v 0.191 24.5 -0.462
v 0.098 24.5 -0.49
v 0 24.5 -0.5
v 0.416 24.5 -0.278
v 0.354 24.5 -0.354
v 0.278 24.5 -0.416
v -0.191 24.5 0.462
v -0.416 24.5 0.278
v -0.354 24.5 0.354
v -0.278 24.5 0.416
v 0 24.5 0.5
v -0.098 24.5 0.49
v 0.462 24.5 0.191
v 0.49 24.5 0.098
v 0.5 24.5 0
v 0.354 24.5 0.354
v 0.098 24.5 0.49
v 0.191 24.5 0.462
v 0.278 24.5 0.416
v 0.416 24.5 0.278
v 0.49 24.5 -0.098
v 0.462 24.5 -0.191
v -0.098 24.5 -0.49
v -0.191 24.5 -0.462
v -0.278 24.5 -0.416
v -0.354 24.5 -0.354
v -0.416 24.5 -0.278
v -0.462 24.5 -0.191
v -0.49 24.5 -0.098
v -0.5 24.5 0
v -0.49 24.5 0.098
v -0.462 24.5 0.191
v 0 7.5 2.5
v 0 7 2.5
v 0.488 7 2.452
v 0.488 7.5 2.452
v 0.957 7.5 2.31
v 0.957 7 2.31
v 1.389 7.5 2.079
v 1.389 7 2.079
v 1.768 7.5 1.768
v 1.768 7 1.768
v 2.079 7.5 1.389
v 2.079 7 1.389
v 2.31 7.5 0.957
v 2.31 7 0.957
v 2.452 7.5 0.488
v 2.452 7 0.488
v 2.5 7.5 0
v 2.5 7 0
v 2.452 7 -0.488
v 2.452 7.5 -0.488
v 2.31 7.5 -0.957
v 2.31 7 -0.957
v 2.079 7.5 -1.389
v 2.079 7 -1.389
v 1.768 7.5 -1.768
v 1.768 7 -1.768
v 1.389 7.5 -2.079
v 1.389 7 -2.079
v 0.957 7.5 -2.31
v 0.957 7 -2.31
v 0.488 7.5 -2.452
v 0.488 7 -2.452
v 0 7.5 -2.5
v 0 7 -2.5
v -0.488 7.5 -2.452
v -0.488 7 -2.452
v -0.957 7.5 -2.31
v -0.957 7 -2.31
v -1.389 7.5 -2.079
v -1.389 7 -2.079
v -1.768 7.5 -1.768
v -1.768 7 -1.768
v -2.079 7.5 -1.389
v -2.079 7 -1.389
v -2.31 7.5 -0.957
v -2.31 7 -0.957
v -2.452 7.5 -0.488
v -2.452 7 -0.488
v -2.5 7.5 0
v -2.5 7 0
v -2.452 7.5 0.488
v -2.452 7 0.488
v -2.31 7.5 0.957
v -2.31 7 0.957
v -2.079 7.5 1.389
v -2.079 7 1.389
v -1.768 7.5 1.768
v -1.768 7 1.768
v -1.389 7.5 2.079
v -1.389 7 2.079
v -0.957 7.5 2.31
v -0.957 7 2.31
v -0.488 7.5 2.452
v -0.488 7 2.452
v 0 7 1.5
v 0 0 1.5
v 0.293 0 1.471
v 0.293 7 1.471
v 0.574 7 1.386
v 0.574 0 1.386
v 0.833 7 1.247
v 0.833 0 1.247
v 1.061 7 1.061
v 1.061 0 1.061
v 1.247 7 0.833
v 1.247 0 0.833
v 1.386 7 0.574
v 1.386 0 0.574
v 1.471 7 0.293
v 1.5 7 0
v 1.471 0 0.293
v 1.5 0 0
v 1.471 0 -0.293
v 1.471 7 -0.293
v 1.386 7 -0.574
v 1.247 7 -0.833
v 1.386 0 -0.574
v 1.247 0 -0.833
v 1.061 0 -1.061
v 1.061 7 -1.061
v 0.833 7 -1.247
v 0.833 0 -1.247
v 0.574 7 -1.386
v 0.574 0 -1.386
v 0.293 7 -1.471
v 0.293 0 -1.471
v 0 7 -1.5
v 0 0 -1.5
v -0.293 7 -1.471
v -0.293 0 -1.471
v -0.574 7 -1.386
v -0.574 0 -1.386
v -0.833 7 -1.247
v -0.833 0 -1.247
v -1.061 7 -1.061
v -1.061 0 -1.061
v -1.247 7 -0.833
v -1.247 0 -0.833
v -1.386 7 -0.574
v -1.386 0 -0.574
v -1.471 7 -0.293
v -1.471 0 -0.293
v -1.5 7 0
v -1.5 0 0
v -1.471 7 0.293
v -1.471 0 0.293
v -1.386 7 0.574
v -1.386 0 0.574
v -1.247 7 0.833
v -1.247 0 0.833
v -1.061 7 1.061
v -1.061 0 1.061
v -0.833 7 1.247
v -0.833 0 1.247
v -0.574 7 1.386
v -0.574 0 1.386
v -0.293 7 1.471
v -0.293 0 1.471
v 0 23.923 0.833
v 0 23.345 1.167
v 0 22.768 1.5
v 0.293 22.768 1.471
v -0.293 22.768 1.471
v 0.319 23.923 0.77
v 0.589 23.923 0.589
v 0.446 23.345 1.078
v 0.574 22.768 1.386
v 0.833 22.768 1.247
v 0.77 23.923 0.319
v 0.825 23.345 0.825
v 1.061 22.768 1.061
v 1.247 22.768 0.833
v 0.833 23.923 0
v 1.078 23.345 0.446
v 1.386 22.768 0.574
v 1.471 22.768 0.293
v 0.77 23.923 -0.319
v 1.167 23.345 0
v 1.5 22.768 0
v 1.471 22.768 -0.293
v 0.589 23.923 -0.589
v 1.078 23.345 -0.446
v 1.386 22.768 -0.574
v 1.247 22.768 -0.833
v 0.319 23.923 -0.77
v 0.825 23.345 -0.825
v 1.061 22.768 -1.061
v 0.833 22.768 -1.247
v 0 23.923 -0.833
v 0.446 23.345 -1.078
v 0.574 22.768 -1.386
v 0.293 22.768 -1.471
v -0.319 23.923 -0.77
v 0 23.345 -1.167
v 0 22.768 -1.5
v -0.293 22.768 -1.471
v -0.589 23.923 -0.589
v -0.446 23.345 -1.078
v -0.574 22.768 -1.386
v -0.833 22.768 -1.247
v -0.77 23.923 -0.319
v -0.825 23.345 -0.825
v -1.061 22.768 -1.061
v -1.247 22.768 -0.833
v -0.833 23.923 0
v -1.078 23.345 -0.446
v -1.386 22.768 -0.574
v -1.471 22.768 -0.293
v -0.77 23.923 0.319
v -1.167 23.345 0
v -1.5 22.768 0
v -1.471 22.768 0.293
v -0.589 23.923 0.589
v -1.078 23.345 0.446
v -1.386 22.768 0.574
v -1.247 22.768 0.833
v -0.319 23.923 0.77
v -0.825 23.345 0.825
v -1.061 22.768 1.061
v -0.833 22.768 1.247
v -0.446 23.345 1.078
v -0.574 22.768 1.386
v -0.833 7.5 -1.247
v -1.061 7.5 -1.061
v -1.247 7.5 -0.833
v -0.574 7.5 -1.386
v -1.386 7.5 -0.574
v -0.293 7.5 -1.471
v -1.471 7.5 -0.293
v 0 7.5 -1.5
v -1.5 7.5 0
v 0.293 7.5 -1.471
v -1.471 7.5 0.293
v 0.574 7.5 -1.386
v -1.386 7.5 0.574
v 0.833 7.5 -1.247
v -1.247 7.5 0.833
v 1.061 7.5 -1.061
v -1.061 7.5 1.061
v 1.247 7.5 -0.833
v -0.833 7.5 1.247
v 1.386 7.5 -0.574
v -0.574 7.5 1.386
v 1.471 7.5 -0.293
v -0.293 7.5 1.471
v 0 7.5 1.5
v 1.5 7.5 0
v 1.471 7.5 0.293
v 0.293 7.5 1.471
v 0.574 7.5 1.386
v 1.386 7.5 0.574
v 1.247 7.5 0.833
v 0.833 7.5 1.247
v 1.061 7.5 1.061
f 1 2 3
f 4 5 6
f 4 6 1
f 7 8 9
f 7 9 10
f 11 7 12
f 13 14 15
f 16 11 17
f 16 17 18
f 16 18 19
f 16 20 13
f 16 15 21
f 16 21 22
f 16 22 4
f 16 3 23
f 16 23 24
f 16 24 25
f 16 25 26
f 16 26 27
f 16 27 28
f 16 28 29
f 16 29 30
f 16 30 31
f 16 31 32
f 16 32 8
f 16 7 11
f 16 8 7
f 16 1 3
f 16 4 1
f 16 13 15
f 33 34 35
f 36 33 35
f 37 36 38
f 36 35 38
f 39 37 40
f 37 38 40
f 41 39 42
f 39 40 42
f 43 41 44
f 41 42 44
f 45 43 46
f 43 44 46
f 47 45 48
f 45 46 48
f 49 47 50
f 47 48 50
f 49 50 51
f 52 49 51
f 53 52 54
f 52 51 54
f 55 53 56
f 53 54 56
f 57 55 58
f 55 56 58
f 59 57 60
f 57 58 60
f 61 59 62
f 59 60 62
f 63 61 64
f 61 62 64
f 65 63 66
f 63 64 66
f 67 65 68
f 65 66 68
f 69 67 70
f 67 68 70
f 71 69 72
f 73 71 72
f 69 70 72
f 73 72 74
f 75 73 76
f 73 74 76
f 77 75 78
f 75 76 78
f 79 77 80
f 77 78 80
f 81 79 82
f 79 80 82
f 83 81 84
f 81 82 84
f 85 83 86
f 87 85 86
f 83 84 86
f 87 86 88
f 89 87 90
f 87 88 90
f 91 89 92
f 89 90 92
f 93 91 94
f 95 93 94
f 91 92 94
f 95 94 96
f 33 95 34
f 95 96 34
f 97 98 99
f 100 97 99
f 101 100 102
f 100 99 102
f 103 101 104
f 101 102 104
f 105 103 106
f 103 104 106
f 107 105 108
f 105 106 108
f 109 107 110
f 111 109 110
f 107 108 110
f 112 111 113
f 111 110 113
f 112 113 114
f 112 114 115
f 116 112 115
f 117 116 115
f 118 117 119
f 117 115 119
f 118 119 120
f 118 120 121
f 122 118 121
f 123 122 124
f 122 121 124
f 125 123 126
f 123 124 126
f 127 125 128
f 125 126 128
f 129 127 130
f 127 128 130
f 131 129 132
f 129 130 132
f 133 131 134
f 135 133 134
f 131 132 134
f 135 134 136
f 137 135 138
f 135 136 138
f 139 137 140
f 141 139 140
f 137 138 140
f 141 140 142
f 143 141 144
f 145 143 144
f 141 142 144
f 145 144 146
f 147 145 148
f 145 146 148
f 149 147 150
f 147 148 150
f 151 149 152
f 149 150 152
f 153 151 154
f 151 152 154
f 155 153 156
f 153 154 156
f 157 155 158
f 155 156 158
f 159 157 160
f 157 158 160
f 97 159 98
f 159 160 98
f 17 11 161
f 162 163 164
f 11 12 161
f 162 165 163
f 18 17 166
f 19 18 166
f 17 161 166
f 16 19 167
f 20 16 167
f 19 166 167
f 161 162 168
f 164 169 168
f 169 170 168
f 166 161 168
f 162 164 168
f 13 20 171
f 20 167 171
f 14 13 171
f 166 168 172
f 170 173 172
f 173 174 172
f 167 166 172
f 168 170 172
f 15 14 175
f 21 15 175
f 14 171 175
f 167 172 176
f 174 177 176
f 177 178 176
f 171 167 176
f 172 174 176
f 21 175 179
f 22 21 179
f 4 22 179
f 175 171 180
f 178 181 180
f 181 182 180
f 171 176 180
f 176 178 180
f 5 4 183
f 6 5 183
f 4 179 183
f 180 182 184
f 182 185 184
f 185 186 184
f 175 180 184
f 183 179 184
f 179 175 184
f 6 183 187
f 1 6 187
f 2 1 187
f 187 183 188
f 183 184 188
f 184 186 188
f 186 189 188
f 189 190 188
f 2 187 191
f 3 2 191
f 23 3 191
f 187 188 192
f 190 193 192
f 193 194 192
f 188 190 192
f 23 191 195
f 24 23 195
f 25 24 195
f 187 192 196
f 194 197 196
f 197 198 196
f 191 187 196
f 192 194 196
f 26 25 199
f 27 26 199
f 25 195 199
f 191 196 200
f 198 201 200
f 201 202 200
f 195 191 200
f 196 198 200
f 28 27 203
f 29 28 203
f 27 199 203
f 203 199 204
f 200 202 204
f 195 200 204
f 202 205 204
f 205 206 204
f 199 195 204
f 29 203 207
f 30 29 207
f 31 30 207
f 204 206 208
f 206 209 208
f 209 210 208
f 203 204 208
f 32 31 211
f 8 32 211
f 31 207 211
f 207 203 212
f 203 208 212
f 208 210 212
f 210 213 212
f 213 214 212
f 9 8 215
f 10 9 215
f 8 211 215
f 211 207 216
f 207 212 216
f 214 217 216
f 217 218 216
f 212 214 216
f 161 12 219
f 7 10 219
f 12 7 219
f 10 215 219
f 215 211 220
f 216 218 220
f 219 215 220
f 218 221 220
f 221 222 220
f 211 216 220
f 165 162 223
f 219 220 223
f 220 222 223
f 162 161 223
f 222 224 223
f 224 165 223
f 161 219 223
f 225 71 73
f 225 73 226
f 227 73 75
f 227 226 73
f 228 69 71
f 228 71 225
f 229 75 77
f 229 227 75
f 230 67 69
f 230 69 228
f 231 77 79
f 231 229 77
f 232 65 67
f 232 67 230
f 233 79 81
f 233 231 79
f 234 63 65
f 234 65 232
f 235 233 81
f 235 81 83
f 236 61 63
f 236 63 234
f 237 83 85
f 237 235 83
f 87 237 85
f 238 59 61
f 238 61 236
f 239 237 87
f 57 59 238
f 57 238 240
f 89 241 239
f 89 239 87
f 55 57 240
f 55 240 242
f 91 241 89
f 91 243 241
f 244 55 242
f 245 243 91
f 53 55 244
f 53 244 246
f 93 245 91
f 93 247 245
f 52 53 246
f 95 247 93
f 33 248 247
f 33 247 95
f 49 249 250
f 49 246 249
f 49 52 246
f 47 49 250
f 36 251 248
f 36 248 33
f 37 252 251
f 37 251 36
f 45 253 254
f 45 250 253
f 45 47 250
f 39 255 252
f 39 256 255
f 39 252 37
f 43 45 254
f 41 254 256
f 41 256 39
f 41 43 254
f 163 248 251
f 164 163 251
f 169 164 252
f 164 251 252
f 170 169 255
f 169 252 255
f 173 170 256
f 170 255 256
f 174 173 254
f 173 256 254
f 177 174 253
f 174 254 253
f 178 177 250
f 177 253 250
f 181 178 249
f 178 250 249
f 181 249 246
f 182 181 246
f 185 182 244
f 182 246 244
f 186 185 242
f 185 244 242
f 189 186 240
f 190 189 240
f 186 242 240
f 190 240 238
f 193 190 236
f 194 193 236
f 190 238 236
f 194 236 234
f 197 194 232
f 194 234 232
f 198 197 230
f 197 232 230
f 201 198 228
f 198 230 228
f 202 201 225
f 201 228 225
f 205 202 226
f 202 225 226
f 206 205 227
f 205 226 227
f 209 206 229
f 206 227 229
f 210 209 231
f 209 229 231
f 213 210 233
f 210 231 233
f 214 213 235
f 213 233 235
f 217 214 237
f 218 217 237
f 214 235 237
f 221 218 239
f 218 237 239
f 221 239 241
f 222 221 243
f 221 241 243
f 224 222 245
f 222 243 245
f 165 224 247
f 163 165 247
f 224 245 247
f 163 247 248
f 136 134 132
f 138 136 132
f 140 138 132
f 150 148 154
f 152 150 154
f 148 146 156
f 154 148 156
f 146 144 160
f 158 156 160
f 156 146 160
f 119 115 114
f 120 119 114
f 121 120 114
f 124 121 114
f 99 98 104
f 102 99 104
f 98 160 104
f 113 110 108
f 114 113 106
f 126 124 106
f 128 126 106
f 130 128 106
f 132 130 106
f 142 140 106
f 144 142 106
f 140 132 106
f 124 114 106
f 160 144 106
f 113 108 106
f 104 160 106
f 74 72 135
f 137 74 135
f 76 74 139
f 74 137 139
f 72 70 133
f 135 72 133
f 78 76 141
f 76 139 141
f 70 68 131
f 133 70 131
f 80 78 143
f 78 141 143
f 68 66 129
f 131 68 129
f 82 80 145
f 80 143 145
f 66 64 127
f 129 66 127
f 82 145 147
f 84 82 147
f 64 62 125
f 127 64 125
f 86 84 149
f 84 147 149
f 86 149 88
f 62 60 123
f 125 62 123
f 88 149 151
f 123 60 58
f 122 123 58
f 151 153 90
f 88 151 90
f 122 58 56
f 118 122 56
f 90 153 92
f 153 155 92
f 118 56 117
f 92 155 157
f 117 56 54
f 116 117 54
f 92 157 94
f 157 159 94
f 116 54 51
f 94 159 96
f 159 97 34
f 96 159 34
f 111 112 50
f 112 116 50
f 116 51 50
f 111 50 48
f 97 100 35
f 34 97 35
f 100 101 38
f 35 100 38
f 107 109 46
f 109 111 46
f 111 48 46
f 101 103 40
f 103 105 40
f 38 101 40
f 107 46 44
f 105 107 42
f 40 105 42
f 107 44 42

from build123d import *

# Parameters (mm, degrees)
SKETCH1_R           = 1.5
BOSS_EXTRUDE1_DEPTH = 7
SKETCH2_R           = 2.5
BOSS_EXTRUDE2_DEPTH = 0.5
SKETCH3_R           = 1.5
BOSS_EXTRUDE3_DEPTH = 17
CHAMFER1_SIZE       = 1
CHAMFER1_SIZE2      = 1.732050808


with BuildPart() as part:
    # Sketch1 → Boss-Extrude1 (new body)
    with BuildSketch(Plane(origin=(0, 0, 0), x_dir=(1, 0, 0), z_dir=(0, 1, 0))):
        with Locations(Location((0, 0, 0), (0, 0, 270))):
            Circle(SKETCH1_R)
    extrude(amount=BOSS_EXTRUDE1_DEPTH)

    # Sketch2 → Boss-Extrude2 (add)
    with BuildSketch(Plane(origin=(0, 7, 0), x_dir=(1, 0, 0), z_dir=(0, 1, 0))):
        with Locations(Location((0, 0, 0), (0, 0, 270))):
            Circle(SKETCH2_R)
    extrude(amount=BOSS_EXTRUDE2_DEPTH)

    # Sketch3 → Boss-Extrude3 (add)
    with BuildSketch(Plane(origin=(0, 7.5, 0), x_dir=(1, 0, 0), z_dir=(0, 1, 0))):
        with Locations(Location((0, 0, 0), (0, 0, 270))):
            Circle(SKETCH3_R)
    extrude(amount=BOSS_EXTRUDE3_DEPTH)

    # Chamfer1
    chamfer1_edges = [part.edges().sort_by_distance(p)[0] for p in [
        (0, 24.5, -1.5),
    ]]
    chamfer1_side = [part.faces().sort_by_distance(p)[0] for p in [
        (0, 24.5, 0),
    ]]
    chamfer(chamfer1_edges, length=CHAMFER1_SIZE, length2=CHAMFER1_SIZE2, reference=chamfer1_side[0])


solid = part.part
